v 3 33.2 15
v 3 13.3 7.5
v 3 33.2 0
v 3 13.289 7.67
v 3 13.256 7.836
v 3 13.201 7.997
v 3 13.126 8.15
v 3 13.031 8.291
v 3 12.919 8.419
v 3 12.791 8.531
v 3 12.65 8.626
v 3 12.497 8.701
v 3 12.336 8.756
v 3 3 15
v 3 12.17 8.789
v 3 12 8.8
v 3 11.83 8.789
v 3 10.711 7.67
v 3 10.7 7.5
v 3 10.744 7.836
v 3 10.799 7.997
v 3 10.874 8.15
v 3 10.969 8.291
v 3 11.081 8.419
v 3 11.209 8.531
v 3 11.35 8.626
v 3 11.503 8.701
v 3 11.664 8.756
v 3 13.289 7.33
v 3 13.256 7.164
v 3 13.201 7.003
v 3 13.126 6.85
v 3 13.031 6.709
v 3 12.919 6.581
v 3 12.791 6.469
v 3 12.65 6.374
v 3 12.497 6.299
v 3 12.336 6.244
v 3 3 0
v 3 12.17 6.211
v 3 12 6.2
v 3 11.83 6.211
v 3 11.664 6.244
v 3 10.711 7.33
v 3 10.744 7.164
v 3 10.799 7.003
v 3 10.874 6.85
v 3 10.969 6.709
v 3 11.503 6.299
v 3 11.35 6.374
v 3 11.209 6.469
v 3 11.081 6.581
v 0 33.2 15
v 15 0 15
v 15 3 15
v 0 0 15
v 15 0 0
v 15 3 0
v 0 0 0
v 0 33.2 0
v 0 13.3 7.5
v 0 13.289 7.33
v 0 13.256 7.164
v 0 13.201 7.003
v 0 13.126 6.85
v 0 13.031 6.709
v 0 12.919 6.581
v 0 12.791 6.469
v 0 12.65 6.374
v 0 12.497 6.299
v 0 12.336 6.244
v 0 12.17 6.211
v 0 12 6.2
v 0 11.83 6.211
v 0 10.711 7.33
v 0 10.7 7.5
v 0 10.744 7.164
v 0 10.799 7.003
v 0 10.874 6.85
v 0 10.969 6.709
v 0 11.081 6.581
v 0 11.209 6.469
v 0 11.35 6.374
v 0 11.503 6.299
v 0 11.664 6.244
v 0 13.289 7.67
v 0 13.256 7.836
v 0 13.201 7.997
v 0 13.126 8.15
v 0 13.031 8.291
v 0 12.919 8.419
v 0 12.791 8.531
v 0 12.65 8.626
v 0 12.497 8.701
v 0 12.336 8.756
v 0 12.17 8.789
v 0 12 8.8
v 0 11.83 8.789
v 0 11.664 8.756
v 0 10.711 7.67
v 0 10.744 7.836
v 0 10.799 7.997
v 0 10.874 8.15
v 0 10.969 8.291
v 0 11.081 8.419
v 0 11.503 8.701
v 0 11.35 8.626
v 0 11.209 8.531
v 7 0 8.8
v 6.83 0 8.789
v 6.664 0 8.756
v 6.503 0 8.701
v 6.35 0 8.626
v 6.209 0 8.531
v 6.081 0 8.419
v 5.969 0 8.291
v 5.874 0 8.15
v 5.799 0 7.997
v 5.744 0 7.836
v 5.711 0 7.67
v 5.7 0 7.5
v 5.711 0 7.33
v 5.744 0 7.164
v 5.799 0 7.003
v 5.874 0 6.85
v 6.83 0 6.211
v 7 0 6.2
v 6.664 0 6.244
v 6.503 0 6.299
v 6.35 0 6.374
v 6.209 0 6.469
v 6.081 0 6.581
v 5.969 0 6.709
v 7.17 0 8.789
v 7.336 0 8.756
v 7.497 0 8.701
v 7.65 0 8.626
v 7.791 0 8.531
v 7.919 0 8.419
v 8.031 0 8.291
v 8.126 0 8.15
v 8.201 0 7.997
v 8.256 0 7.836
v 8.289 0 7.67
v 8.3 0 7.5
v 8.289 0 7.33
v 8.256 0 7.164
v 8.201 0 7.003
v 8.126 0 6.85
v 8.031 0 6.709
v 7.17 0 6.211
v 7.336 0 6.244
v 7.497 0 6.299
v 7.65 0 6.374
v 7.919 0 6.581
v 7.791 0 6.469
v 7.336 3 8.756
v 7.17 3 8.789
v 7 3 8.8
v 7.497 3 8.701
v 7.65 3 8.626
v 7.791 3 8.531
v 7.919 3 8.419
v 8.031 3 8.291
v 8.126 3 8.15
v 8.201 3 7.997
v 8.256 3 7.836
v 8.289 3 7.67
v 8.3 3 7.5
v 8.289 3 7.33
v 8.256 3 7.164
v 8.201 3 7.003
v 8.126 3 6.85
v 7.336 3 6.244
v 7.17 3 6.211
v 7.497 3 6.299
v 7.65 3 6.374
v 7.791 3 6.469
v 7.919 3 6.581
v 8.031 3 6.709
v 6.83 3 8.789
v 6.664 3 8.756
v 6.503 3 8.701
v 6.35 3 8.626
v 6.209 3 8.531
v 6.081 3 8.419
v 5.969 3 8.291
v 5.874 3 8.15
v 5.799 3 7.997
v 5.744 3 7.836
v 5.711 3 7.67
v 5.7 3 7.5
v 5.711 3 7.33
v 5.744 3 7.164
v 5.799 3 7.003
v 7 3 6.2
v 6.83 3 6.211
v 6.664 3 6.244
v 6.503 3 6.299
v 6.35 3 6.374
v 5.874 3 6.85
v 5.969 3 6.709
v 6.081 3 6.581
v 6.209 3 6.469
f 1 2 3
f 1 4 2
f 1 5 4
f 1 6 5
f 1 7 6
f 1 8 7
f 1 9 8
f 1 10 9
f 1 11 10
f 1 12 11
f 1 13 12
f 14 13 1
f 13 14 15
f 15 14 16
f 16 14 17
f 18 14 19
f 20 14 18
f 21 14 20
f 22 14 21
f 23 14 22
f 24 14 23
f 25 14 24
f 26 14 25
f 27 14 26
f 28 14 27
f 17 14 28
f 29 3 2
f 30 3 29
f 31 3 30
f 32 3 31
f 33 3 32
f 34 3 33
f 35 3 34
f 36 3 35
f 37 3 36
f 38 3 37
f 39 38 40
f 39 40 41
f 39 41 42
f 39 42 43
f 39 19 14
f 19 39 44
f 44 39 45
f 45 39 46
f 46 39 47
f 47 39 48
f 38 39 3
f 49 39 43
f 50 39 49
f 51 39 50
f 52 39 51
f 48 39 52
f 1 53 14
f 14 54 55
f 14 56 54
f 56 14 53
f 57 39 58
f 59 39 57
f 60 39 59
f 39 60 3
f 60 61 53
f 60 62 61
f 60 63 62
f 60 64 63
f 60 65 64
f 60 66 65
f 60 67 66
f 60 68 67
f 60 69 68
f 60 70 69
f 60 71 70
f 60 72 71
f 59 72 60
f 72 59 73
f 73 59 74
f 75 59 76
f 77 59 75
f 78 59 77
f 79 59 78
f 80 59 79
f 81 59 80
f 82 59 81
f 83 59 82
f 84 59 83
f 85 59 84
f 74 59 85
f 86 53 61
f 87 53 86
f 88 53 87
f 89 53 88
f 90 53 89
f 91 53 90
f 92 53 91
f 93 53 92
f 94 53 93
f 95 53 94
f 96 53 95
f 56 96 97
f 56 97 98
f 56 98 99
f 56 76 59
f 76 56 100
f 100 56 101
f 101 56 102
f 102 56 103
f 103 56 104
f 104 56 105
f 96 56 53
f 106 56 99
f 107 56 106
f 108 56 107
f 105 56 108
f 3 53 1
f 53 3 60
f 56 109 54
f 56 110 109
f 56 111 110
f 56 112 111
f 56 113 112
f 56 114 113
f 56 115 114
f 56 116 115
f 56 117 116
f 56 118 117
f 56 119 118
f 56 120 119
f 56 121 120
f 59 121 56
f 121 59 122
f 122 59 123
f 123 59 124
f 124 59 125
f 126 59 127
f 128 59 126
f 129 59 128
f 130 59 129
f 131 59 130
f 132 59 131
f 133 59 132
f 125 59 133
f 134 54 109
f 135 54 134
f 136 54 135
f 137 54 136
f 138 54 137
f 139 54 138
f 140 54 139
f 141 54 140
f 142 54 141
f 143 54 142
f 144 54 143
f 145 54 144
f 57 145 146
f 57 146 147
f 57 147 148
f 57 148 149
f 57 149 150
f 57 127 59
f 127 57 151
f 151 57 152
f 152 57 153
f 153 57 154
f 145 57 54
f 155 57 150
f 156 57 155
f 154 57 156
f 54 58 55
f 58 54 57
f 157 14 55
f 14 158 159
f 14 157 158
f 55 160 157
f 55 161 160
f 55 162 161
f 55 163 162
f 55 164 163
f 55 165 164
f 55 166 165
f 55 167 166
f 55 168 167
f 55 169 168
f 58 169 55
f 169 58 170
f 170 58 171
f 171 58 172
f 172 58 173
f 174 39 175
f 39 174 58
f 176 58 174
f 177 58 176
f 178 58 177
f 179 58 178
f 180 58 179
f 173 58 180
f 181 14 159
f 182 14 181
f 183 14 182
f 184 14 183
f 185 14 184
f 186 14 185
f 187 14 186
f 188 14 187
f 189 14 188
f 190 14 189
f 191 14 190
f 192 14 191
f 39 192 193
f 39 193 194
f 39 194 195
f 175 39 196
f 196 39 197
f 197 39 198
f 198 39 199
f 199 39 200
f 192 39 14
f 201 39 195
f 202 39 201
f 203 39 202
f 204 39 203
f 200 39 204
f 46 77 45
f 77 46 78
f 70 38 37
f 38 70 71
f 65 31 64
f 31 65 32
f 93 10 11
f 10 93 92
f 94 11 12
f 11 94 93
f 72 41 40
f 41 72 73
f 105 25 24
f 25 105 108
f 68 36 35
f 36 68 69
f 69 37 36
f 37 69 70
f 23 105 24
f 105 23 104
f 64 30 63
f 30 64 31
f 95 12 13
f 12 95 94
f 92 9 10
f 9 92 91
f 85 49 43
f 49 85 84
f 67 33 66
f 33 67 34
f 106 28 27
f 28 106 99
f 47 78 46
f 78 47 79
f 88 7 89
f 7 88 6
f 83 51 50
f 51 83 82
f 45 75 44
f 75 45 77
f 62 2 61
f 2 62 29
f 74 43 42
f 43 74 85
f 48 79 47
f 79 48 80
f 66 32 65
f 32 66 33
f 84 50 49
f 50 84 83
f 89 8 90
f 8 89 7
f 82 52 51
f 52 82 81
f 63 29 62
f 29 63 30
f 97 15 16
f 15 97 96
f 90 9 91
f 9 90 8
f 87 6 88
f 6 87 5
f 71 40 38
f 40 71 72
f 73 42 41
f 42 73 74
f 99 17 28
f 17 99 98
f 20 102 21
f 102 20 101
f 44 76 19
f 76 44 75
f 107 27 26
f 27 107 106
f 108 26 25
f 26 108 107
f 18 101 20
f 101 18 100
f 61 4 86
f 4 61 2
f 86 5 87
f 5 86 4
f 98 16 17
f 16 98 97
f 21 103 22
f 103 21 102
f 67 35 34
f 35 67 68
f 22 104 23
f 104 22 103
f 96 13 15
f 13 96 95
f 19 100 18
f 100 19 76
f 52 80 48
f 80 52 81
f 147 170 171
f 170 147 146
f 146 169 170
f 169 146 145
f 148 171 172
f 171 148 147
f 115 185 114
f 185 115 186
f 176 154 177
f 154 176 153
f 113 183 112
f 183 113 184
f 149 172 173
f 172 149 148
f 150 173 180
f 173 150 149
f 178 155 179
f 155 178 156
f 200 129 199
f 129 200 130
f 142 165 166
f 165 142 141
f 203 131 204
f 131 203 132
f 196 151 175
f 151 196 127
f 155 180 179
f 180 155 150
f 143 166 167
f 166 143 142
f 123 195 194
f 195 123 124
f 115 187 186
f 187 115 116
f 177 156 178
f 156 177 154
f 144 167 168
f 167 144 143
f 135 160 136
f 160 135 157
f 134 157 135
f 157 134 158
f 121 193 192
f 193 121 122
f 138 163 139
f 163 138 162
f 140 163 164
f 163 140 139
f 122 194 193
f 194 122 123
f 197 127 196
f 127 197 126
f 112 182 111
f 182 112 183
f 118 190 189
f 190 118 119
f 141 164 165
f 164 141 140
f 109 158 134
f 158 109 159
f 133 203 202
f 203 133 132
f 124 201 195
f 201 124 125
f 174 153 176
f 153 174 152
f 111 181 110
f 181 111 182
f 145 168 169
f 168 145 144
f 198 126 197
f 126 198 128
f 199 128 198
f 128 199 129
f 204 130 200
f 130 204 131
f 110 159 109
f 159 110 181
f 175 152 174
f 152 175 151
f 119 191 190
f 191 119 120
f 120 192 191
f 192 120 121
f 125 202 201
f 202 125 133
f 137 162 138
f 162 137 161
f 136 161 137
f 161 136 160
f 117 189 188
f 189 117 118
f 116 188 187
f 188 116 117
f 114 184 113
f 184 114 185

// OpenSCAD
// =====================================================================
//  Squadretta a L stampabile - fissaggio Frontale/Retro <-> Fianchi
//  HIFI STREAMER case
//  ---------------------------------------------------------------
//  Sostituisce la "staffa 15x15x1.5mm" comprata (vedi hardware/README.md
//  § 5 "Hardware da acquistare"), che nel case reale non entra/non
//  allinea bene con i fori.
//
//  Misure derivate DIRETTAMENTE dai parametri usati per tagliare la
//  lamiera reale (hardware/freecad/streamer_sheetmetal.py):
//    - spessore lamiera nominale    = 2.0 mm (t nello script lamiera)
//    - offset foro lato fianco     = fl/2               = 9.0 mm  (y_front / y_back)
//    - offset foro lato pannello   = bracket_edge - t   = 6.5 mm  (bracket_edge=10,
//      corretto di -t perché lo spigolo interno della L appoggia sulla faccia
//      INTERNA del fianco, a X=t dal bordo esterno del case, non su X=0.
//      Qui t=3.5mm: NON è più lo spessore nominale lamiera (2.0mm) ma un
//      valore ricalibrato misurando il case reale, per avvicinare il foro
//      pannello allo spigolo e togliere la staffa dall'ingombro che sporgeva.)
//    - viti usate: M3x8 autofilettanti (elemento "①b" nella distinta)
//    - livelli Z staffe: 30 / 86.1 / 142.3 mm dal fondo (bz nel CAD)
//      -> sul FRONTALE si usa SOLO il livello basso (30mm): al centro/alto
//         c'e' lo schermo e non c'e' spazio. Sul RETRO tutti e 3 i livelli.
//      -> la staffa e' identica per tutte le posizioni: stessa parte,
//         serve in 8 esemplari (2 frontale + 6 retro).
//
//  NOTA IMPORTANTE sui fori: nel CAD della lamiera il foro nel fianco è
//  "clearance" (Ø3.4) e quello nel pannello frontale/retro è "pilota"
//  (Ø2.6, pensato per autofilettarsi nell'alluminio da 2mm). Per una
//  staffa STAMPATA è più affidabile far avvitare la vite autofilettante
//  SEMPRE nella staffa in plastica (più materiale, presa migliore) e
//  trattare i fori nella lamiera come semplice passaggio. Per questo qui
//  entrambi i fori della staffa sono "pilota" di default: se nel tuo case
//  un foro lamiera risulta troppo stretto, allargalo a Ø3.2-3.4mm con un
//  trapano a mano (la vite deve scorrere libera nella lamiera e mordere
//  solo nella staffa).
//
//  Se le misure non combaciano col tuo case fisico (il progetto è
//  segnalato come BETA/non validato in hardware/README.md), misura con
//  un calibro la posizione reale dei fori e correggi i parametri sotto.
// =====================================================================

// --------------------- PARAMETRI (modifica qui) ---------------------

// Lunghezza delle due gambe della staffa, misurata dallo spigolo interno
leg_fianco    = 33.2;   // gamba che appoggia sul FIANCO del corpo
leg_pannello  = 15;   // gamba che appoggia sul pannello FRONTALE/RETRO

// "Profondità" della staffa (asse lungo cui è estrusa la L) [mm]
larghezza     = 15;

// Spessore pareti stampate [mm]
// (l'originale comprato è lamiera da 1.5mm: troppo sottile per una vite
//  autofilettante in plastica -> qui più spesso per tenuta del filetto)
spessore      = 3;

// Spessore lamiera del case (t nel CAD lamiera) [mm]
// Serve per correggere l'offset del foro "pannello": lo spigolo interno
// della L appoggia sulla faccia INTERNA del fianco, che sta a X=t dal
// bordo esterno del case, mentre bracket_edge è misurato dal bordo
// esterno (X=0). Senza questa correzione il foro pannello risulta
// spostato di t mm rispetto ai fori reali di front/back (il foro fianco
// invece non ne ha bisogno: il suo asse combacia già col datum del body).
t = 3;

// Offset dei fori dallo spigolo interno della L, lungo la rispettiva gamba
// (presi identici al CAD della lamiera: fl/2 e bracket_edge)
foro_fianco_offset    = 12;        // = fl/2 = 18/2
foro_pannello_offset  = 10 - t;   // = bracket_edge - t (vedi nota sopra)

// Diametri fori per vite M3 autofilettante (pilota: si avvita nella staffa)
d_foro_fianco    = 2.6;
d_foro_pannello  = 2.6;

// Se true, stampa una piastra con 8 copie (6 retro + 2 frontale) pronte
// per un'unica stampa; se false, stampa un solo pezzo.
stampa_piastra_8pz = false;

$fn = 48;

// --------------------------- MODULO ----------------------------------

module squadretta() {
    difference() {
        union() {
            // gamba contro il FIANCO (piano Y-Z, spessore lungo X)
            cube([spessore, leg_fianco, larghezza]);
            // gamba contro il PANNELLO frontale/retro (piano X-Z, spessore lungo Y)
            cube([leg_pannello, spessore, larghezza]);
        }
        // foro sulla gamba "fianco" - asse del foro lungo X
        translate([-1, foro_fianco_offset, larghezza / 2])
            rotate([0, 90, 0])
                cylinder(d = d_foro_fianco, h = spessore + 2);

        // foro sulla gamba "pannello" - asse del foro lungo Y
        translate([foro_pannello_offset, -1, larghezza / 2])
            rotate([-90, 0, 0])
                cylinder(d = d_foro_pannello, h = spessore + 2);
    }
}

// --------------------------- OUTPUT -----------------------------------

if (stampa_piastra_8pz) {
    passo = max(leg_fianco, leg_pannello) + 5;
    for (i = [0:7]) {
        translate([floor(i / 4) * passo, (i % 4) * passo, 0])
            squadretta();
    }
} else {
    squadretta();
}
